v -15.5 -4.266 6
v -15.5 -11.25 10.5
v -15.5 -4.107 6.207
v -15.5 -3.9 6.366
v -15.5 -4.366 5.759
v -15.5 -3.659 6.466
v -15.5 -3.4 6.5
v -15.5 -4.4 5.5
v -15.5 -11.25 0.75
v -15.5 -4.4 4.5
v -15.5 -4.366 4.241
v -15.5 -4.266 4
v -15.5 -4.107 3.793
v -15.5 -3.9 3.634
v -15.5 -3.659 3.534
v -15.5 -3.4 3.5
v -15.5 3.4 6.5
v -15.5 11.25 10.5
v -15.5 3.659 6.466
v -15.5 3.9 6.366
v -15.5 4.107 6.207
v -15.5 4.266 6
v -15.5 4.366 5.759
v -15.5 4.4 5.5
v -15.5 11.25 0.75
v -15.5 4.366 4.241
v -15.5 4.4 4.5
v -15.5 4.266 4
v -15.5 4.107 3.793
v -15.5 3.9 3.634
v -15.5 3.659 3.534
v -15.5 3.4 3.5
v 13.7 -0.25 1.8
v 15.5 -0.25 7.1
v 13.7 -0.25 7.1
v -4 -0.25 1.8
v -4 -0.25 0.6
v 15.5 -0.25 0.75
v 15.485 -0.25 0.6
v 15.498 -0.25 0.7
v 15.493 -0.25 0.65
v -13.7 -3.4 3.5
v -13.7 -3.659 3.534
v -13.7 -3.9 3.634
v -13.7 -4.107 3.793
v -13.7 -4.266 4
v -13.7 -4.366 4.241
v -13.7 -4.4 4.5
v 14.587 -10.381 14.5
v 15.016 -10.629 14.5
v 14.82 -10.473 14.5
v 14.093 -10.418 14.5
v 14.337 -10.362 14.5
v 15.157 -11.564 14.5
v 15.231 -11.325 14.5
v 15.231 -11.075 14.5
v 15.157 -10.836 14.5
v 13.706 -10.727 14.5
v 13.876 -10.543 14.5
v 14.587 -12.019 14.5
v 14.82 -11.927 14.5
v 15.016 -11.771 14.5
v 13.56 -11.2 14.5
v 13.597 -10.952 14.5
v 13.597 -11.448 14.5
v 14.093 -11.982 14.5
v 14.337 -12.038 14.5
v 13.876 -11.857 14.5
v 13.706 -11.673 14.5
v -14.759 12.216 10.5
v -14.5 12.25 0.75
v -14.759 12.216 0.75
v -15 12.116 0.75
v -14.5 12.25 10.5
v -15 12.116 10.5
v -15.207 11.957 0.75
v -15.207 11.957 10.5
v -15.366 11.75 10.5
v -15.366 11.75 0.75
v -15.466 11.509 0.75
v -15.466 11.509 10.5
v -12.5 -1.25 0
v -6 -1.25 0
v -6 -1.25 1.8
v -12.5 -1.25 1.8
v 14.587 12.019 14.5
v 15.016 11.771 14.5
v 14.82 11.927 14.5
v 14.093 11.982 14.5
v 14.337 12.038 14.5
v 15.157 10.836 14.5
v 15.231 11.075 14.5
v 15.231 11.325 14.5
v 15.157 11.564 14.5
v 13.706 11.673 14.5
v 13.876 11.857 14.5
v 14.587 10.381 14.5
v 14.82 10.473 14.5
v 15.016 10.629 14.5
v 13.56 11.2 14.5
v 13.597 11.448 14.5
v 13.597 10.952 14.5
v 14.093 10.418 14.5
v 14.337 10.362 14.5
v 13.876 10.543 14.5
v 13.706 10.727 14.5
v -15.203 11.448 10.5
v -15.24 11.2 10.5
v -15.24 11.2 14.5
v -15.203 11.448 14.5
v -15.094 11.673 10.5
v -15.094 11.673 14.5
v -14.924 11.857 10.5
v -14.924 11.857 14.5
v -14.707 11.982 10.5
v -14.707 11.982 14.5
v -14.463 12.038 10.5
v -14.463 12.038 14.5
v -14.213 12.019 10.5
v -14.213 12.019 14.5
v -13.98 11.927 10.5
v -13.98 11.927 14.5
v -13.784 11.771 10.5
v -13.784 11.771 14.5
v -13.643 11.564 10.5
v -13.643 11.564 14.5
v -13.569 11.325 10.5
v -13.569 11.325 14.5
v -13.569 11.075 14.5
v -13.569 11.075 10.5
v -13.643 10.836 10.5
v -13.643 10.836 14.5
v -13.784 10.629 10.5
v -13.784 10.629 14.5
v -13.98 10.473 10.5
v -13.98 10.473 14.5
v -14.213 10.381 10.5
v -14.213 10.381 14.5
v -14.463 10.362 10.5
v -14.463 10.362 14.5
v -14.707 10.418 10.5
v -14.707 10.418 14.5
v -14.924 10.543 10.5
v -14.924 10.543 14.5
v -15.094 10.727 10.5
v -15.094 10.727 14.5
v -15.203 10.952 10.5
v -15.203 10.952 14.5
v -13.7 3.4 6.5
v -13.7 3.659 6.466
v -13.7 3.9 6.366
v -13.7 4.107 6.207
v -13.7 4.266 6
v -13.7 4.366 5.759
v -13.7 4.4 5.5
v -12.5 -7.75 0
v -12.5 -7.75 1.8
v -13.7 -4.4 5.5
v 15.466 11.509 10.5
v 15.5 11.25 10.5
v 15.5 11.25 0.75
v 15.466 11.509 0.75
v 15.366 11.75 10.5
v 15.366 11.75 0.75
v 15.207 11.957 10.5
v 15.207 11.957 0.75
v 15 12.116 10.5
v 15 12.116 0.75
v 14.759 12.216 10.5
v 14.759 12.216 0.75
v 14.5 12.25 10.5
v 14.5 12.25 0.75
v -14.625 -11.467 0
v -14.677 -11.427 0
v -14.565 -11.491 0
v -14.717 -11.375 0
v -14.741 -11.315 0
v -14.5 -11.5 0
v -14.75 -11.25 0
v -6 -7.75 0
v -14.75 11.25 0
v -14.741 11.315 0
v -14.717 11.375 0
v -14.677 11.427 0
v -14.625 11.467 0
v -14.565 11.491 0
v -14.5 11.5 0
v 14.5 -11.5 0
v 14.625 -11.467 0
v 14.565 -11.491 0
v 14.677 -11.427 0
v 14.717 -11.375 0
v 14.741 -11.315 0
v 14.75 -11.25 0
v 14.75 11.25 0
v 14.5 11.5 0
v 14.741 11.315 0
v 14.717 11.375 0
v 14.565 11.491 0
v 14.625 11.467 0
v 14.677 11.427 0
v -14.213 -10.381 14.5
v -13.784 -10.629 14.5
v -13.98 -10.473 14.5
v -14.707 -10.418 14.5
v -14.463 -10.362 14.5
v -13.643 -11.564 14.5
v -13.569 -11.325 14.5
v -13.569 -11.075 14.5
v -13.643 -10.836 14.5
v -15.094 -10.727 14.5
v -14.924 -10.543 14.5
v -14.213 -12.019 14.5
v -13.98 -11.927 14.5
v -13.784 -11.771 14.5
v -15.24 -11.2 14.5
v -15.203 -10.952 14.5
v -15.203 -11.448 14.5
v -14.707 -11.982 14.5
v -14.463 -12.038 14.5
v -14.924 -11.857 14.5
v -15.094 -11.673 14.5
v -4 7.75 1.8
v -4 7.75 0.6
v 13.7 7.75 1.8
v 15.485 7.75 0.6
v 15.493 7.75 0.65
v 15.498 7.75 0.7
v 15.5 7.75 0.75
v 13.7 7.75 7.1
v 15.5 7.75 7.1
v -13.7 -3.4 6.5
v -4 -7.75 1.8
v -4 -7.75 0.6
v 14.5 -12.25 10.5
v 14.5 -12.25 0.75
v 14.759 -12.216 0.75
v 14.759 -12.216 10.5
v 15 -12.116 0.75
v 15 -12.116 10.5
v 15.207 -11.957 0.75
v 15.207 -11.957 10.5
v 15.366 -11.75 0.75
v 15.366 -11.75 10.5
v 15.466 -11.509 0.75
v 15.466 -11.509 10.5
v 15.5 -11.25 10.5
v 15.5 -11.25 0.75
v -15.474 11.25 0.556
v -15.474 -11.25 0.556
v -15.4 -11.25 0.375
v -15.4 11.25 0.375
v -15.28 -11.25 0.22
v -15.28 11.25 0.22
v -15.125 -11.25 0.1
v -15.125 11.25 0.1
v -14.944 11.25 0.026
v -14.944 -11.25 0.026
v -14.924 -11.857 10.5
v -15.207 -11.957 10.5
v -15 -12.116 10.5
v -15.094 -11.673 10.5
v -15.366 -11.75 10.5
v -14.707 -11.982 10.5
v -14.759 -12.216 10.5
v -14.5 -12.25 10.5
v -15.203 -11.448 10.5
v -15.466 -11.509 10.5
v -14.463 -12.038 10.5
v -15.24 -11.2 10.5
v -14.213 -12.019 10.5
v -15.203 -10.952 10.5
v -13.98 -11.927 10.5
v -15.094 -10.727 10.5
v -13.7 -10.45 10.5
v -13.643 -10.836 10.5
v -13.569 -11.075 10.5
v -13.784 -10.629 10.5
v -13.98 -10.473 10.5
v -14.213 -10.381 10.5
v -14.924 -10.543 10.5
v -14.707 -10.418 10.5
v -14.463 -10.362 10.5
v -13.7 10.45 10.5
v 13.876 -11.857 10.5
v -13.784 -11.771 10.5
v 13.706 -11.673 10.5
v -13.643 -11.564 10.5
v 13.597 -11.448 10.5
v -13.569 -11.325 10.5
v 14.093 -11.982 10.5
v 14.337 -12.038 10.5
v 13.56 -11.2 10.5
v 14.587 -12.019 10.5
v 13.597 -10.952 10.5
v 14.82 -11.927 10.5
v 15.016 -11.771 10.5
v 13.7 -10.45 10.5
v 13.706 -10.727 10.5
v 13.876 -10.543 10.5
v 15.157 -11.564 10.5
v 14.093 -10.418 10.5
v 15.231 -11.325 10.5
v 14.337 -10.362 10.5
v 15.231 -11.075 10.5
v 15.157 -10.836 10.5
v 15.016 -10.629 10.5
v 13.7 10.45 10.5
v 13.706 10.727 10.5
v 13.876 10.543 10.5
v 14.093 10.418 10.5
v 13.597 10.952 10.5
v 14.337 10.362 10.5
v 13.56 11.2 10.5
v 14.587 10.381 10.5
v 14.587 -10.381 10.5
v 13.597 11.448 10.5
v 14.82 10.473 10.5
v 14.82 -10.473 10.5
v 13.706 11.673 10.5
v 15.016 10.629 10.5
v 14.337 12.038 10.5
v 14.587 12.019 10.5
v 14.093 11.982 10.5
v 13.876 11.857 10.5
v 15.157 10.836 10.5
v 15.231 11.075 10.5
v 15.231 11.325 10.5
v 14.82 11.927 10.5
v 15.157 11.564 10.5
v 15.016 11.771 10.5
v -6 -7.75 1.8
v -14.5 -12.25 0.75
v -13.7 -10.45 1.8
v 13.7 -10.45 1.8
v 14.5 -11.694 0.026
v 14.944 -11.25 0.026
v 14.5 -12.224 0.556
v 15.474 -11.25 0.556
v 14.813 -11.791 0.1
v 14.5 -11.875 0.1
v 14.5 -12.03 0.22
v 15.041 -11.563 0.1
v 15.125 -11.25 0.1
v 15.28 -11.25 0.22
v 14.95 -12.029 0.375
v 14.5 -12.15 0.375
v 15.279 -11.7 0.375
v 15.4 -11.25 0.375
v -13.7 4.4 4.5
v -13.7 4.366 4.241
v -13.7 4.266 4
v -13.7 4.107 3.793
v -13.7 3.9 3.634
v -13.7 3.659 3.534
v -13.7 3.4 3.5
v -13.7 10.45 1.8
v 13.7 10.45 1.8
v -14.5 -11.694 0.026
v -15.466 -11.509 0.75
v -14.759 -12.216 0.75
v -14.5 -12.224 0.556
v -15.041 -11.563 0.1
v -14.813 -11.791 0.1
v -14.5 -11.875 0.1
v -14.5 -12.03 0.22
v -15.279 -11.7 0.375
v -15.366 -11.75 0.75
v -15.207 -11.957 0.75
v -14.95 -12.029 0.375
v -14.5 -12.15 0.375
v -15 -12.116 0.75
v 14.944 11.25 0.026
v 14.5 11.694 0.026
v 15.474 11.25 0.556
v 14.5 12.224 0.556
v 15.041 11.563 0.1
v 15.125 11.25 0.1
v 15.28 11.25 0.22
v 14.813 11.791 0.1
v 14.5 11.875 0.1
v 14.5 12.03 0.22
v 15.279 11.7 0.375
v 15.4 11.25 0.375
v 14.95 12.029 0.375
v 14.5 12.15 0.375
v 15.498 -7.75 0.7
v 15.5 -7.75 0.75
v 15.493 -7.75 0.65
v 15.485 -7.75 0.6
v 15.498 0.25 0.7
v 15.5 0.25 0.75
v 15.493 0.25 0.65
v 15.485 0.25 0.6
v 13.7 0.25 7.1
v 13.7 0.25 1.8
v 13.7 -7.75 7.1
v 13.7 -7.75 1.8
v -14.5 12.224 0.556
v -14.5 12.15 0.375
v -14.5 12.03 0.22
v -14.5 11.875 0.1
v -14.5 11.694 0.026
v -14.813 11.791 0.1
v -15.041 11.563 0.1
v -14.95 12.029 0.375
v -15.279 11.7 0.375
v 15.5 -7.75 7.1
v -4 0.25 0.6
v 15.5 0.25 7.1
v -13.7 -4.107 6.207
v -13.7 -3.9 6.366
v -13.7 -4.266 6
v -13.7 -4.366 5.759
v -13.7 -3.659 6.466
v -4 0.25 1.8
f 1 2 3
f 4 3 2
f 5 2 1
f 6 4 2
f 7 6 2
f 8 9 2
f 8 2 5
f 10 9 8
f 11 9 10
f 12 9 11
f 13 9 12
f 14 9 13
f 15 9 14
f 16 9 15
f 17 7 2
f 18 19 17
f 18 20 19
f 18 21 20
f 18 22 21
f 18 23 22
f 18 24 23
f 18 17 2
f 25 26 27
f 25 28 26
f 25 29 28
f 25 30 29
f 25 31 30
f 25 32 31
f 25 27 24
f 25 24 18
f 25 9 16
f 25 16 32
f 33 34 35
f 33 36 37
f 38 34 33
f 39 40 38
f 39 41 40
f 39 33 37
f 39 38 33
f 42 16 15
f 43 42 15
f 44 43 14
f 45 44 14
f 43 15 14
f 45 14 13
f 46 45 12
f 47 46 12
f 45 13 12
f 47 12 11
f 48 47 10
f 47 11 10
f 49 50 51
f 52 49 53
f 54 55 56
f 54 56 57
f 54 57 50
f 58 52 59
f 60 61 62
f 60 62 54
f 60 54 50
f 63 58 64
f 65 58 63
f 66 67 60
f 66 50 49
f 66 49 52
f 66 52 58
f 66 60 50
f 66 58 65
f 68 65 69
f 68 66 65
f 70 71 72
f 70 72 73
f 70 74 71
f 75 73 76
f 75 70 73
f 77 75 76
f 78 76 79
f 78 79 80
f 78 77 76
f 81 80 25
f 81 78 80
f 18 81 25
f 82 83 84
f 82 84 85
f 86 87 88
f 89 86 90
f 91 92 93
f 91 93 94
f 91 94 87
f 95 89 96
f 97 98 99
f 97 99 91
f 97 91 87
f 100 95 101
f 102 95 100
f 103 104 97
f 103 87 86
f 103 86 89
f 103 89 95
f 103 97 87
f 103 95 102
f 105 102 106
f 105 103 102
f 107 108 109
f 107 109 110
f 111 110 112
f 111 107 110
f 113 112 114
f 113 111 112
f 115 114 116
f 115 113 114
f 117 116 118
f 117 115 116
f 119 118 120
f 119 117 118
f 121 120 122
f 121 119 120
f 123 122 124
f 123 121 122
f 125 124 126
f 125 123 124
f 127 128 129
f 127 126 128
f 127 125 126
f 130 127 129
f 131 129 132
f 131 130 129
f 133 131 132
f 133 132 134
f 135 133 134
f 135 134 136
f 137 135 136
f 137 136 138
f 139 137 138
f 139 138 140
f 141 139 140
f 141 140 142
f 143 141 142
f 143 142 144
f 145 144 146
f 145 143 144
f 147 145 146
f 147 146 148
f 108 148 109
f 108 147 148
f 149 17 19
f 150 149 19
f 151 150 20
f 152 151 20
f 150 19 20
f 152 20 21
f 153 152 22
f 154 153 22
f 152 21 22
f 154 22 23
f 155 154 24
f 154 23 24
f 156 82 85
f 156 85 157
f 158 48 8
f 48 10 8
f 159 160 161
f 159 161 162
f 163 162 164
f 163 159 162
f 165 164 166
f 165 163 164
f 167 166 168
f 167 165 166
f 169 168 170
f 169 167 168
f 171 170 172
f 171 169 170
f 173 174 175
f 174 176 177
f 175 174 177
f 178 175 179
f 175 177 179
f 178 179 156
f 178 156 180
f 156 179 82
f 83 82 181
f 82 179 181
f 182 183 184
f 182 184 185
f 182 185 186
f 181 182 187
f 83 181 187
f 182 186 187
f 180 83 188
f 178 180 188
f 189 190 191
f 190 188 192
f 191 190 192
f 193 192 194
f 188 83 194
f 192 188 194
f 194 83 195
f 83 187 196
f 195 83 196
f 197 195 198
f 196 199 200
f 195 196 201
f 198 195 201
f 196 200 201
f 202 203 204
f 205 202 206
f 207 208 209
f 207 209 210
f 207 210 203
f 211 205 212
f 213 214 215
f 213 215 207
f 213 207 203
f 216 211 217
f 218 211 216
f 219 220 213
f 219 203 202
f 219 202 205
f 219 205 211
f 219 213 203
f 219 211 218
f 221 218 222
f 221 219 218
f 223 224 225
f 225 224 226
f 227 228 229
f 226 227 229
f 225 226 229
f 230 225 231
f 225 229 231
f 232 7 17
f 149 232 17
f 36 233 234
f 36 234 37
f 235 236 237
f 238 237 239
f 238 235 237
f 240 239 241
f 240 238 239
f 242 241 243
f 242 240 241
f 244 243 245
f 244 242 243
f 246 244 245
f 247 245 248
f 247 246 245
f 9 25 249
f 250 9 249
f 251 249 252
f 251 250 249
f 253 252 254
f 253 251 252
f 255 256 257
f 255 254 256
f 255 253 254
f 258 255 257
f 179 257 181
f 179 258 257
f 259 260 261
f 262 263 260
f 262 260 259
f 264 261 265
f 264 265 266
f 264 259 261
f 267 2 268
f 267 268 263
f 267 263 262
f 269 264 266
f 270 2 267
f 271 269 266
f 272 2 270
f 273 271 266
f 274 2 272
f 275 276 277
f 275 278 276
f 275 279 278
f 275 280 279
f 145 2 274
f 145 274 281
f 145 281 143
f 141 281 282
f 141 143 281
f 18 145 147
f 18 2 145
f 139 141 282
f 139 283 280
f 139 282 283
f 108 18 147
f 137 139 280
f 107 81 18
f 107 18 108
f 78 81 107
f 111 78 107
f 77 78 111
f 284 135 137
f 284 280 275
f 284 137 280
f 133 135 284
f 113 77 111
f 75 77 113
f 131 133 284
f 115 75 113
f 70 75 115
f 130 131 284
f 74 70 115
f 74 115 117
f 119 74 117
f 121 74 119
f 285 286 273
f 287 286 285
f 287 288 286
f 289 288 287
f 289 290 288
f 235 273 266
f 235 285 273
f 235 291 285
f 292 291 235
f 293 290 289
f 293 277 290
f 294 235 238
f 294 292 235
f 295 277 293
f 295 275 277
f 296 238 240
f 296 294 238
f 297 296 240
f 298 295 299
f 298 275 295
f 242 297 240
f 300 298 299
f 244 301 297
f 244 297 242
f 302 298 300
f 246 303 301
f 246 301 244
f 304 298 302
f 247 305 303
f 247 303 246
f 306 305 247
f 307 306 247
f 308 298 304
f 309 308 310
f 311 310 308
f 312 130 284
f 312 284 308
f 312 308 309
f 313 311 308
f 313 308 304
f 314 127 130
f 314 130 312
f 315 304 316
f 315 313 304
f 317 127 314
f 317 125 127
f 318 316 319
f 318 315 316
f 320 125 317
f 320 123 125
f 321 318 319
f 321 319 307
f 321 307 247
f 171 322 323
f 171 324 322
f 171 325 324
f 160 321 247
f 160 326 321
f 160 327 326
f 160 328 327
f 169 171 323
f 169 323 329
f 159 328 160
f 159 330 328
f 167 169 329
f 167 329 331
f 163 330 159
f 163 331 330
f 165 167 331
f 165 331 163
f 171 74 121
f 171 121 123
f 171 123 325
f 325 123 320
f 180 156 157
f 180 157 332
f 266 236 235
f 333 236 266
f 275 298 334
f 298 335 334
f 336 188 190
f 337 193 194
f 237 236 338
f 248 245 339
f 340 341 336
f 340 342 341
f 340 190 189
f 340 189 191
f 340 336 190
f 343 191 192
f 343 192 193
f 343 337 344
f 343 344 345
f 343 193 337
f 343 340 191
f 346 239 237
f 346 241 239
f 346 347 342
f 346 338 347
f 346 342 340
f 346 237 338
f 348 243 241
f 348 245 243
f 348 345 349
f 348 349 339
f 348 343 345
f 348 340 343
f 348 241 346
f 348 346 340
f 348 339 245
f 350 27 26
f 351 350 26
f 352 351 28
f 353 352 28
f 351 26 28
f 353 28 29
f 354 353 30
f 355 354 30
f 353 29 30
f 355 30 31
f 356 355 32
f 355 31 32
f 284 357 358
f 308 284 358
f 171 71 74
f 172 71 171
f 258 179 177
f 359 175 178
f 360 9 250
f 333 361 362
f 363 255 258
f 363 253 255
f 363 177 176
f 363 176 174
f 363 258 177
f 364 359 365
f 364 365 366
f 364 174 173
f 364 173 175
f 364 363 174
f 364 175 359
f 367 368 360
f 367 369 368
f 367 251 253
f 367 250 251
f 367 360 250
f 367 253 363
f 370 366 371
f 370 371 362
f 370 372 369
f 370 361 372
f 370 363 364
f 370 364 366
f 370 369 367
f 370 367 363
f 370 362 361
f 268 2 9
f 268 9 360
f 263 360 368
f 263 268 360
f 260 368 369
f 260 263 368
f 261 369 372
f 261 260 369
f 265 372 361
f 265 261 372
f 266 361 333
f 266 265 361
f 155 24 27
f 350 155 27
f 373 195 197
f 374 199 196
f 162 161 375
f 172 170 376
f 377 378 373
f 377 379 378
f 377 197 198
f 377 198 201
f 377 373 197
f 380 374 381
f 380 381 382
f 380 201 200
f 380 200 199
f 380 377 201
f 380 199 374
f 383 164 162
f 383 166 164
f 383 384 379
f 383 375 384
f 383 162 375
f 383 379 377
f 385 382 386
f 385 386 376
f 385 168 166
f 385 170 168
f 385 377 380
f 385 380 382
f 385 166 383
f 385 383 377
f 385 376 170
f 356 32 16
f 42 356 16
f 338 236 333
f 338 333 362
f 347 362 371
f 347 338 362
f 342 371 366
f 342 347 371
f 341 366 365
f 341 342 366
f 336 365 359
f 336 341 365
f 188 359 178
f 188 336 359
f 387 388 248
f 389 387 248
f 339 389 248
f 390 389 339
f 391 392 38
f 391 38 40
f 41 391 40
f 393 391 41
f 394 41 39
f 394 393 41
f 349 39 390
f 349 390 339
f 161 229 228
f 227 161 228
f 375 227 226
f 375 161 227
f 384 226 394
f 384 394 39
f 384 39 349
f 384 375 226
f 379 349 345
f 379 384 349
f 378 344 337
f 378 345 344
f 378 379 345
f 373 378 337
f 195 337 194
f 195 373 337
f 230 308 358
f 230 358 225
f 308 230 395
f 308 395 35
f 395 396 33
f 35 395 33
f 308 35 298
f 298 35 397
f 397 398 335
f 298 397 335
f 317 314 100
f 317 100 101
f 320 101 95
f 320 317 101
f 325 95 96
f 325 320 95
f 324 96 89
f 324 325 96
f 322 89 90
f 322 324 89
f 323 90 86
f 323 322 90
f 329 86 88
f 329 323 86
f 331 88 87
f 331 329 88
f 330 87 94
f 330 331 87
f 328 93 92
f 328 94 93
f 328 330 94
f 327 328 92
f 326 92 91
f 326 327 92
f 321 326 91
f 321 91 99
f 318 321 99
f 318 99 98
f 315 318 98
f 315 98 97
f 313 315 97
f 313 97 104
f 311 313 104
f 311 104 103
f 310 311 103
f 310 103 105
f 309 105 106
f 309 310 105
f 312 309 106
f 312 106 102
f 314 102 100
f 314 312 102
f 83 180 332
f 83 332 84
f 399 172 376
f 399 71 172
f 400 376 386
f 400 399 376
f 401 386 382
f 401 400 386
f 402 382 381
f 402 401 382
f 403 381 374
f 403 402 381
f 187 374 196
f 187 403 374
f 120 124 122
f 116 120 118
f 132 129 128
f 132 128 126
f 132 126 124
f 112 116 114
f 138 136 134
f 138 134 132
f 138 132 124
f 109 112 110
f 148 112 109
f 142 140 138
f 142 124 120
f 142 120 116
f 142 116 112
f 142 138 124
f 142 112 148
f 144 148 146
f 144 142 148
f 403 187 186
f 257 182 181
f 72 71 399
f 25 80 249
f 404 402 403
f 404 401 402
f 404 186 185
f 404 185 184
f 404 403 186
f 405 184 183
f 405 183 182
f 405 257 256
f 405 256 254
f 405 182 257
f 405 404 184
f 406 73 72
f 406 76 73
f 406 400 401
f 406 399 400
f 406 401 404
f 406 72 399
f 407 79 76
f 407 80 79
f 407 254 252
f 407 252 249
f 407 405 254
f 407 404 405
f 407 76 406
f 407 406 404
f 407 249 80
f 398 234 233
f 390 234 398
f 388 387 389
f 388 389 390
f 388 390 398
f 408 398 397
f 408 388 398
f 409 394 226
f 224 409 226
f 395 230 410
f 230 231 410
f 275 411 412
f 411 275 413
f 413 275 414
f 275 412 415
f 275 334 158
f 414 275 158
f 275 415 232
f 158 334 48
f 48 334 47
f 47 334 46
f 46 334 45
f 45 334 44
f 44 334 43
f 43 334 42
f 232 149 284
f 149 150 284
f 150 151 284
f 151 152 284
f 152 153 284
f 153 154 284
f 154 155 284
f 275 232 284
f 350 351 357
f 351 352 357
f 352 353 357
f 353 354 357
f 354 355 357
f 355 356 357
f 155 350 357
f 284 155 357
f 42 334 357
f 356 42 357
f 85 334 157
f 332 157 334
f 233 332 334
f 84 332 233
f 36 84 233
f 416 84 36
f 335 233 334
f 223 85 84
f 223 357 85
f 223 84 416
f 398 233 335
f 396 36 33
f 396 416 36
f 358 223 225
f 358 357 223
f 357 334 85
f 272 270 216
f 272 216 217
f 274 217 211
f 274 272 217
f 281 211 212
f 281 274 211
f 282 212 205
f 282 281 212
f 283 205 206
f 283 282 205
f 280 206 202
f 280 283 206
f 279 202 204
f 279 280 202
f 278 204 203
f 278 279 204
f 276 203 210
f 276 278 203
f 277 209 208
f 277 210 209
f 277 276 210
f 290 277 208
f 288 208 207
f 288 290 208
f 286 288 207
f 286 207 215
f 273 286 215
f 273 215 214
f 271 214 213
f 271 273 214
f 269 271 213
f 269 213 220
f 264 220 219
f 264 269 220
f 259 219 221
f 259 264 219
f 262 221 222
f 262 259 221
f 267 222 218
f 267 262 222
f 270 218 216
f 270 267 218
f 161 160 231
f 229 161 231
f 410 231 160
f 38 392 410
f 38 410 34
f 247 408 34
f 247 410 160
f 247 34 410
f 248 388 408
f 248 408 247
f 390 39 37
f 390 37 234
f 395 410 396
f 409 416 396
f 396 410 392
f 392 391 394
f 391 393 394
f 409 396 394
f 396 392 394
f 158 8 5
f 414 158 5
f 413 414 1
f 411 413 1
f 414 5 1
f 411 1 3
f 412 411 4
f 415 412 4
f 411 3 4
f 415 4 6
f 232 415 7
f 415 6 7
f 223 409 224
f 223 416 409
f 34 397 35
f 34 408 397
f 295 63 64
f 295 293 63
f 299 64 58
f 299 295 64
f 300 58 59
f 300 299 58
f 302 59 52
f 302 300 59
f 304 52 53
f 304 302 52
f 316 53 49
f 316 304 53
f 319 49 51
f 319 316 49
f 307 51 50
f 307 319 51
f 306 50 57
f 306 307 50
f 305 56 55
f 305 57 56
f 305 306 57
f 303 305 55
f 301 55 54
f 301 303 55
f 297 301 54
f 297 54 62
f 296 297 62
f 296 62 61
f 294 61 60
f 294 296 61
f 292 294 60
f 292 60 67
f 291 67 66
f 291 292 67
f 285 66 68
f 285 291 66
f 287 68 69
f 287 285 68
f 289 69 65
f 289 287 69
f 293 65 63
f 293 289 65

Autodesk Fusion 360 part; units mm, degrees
sketch "Sketch1" plane through (0, 0, 0) normal (0, 0, 1) x (1, 0, 0)
  line L0 (-15.5, 12.25) -> (15.5, 12.25)
  line L1 (15.5, 12.25) -> (15.5, -12.25)
  line L2 (15.5, -12.25) -> (-15.5, -12.25)
  line L3 (-15.5, -12.25) -> (-15.5, 12.25)
  line L4 (-15.5, 12.25) -> (15.5, -12.25) construction
  line L5 (15.5, 12.25) -> (-15.5, -12.25) construction
  dimension "d1" = 31
  dimension "d2" = 24.5
extrude "Extrude1" add sketch "Sketch1" along normal blind 10.5
shell "Shell1" thickness 1.8 removed faces 1 at (-5.1667, 4.0833, 10.5)
sketch "Sketch2" plane through (0, 0, 10.5) normal (0, 0, 1) x (-1, 0, 0)
  line L0 (13.7, 10.45) -> (13.7, -10.45)
  line L1 (13.7, -10.45) -> (-13.7, -10.45)
  line L2 (-13.7, -10.45) -> (-13.7, 10.45)
  line L3 (-13.7, 10.45) -> (13.7, 10.45)
  line L4 (15.5, 12.25) -> (-15.5, 12.25)
  line L5 (-15.5, 12.25) -> (-15.5, -12.25)
  line L6 (-15.5, -12.25) -> (15.5, -12.25)
  line L7 (15.5, -12.25) -> (15.5, 12.25)
  circle A0 centre (14.4, -11.2) radius 0.84
  line L8 (0, 0) -> (0, -2)
  line L9 (0, 0) -> (4, 0)
  circle A1 centre (-14.4, -11.2) radius 0.84
  circle A2 centre (-14.4, 11.2) radius 0.84
  circle A3 centre (14.4, 11.2) radius 0.84
  dimension "d6" = 1.68
  dimension "d7" = 11.2
  dimension "d8" = 14.4
extrude "Extrude2" add sketch "Sketch2" along normal blind 4 contours A0 | A1 | A2 | A3
fillet "Fillet1" radius 1 1 edges at (15.5, -12.25, 5.25)
fillet "Fillet1" radius 1 1 edges at (15.5, 12.25, 5.25)
fillet "Fillet1" radius 1 1 edges at (-15.5, 12.25, 5.25)
fillet "Fillet1" radius 1 1 edges at (-15.5, -12.25, 5.25)
sketch "Sketch3" plane through (-15.5, 0, 0) normal (-1, 0, 0) x (0, -1, 0)
  line L0 (11.25, 0) -> (11.25, 10.5)
  line L1 (11.25, 10.5) -> (-11.25, 10.5)
  line L2 (-11.25, 10.5) -> (-11.25, 0)
  line L3 (-11.25, 0) -> (11.25, 0)
  line L4 (0, 0) -> (0, 3.5)
  line L5 (0, 3.5) -> (0, 5)
  line L6 (-3.4, 3.5) -> (3.4, 3.5)
  line L7 (4.4, 4.5) -> (4.4, 5.5)
  line L8 (3.4, 6.5) -> (-3.4, 6.5)
  line L9 (-4.4, 5.5) -> (-4.4, 4.5)
  line L10 (-4.4, 3.5) -> (4.4, 6.5) construction
  line L11 (4.4, 3.5) -> (-4.4, 6.5) construction
  arc A0 (-3.4, 6.5) -> (-4.4, 5.5) centre (-3.4, 5.5) ccw
  arc A1 (-4.4, 4.5) -> (-3.4, 3.5) centre (-3.4, 4.5) ccw
  arc A2 (3.4, 3.5) -> (4.4, 4.5) centre (3.4, 4.5) ccw
  arc A3 (4.4, 5.5) -> (3.4, 6.5) centre (3.4, 5.5) ccw
  point P0 (0, 5)
  dimension "d19" = 3.5
  dimension "d20" = 1.5
  dimension "d21" = 3
  dimension "d22" = 8.8
  dimension "d23" = 1
extrude "Extrude3" cut sketch "Sketch3" against normal blind 6 contours L6 L7 L8 L9 A0 A1 A2 A3
fillet "Fillet2" radius 0.75 8 edges at (-15.2071, -11.9571, 0) (-15.5, 0, 0) (-15.2071, 11.9571, 0) (0, 12.25, 0) (15.2071, 11.9571, 0) (15.5, 0, 0) (15.2071, -11.9571, 0) (0, -12.25, 0)
sketch "Sketch4" plane through (0, 0, 0) normal (0, 0, -1) x (1, 0, 0)
  arc A0 (-14.5, 11.5) -> (-14.75, 11.25) centre (-14.5, 11.25) ccw
  line L0 (-14.75, 11.25) -> (-14.75, -11.25)
  arc A1 (-14.75, -11.25) -> (-14.5, -11.5) centre (-14.5, -11.25) ccw
  line L1 (-14.5, -11.5) -> (14.5, -11.5)
  arc A2 (14.5, -11.5) -> (14.75, -11.25) centre (14.5, -11.25) ccw
  line L2 (14.75, -11.25) -> (14.75, 11.25)
  arc A3 (14.75, 11.25) -> (14.5, 11.5) centre (14.5, 11.25) ccw
  line L3 (14.5, 11.5) -> (-14.5, 11.5)
  line L4 (-14.75, 0) -> (-12.7501, 0.0149)
  line L5 (7.2499, 0.0149) -> (7.2499, 8.7649)
  line L6 (7.2499, 8.7649) -> (-12.7501, 8.7649)
  line L7 (-12.7501, 8.7649) -> (-12.7501, 0.0149)
  line L8 (7.2499, 0.0149) -> (7.2499, -8.7351)
  line L9 (7.2499, -8.7351) -> (-12.7501, -8.7351)
  line L10 (-12.7501, -8.7351) -> (-12.7501, 0.0149)
  line L11 (-12.7501, -8.7351) -> (-11.7501, -8.7351)
  line L12 (-11.7501, -8.7351) -> (-11.7501, -7.7351)
  line L13 (-11.7501, -7.7351) -> (-5.2501, -7.7351)
  line L14 (-5.2501, -7.7351) -> (-5.2501, -1.2351)
  line L15 (-5.2501, -1.2351) -> (-11.7501, -1.2351)
  line L16 (-11.7501, -1.2351) -> (-11.7501, -7.7351)
  line L17 (7.2499, 8.7649) -> (6.2499, 8.7649)
  line L18 (-5.2501, -7.7351) -> (-2.2501, -7.7351)
  line L19 (-2.2501, -7.7351) -> (12.4499, -7.7351)
  line L20 (12.4499, -7.7351) -> (12.4499, -0.7351)
  dimension "d32" = 20
  dimension "d33" = 8.75
  dimension "d34" = 1
  dimension "d35" = 1
  dimension "d38" = 6.5
  dimension "d39" = 6.5
  dimension "d42" = 1
  dimension "d54" = 3
  dimension "d55" = 14.7
  dimension "d56" = 7
sketch "Sketch6" plane through (0, 0, 0) normal (0, 0, -1) x (1, 0, 0)
  arc A0 (-14.5, 11.5) -> (-14.75, 11.25) centre (-14.5, 11.25) ccw
  line L0 (-14.75, 11.25) -> (-14.75, -11.25)
  arc A1 (-14.75, -11.25) -> (-14.5, -11.5) centre (-14.5, -11.25) ccw
  line L1 (-14.5, -11.5) -> (14.5, -11.5)
  arc A2 (14.5, -11.5) -> (14.75, -11.25) centre (14.5, -11.25) ccw
  line L2 (14.75, -11.25) -> (14.75, 11.25)
  arc A3 (14.75, 11.25) -> (14.5, 11.5) centre (14.5, 11.25) ccw
  line L3 (14.5, 11.5) -> (-14.5, 11.5)
  line L4 (-15.5, 0) -> (-13.5, 0)
  line L5 (6.5, 0) -> (6.5, 8.75)
  line L6 (6.5, 8.75) -> (-13.5, 8.75)
  line L7 (-13.5, 8.75) -> (-13.5, 0)
  line L8 (-13.5, -8.75) -> (-13.5, 0)
  line L9 (6.5, -8.75) -> (-13.5, -8.75)
  line L10 (6.5, 0) -> (6.5, -8.75)
  line L11 (-13.5, 8.75) -> (-13.5, 7.75)
  line L12 (-13.5, 7.75) -> (-12.5, 7.75)
  line L13 (-12.5, 7.75) -> (-6, 7.75)
  line L14 (-6, 7.75) -> (-6, 1.25)
  line L15 (-6, 1.25) -> (-12.5, 1.25)
  line L16 (-12.5, 1.25) -> (-12.5, 7.75)
  point P0 (-13.7, 10.45)
  dimension "d57" = 2
  dimension "d58" = 10.45
  dimension "d61" = 20
  dimension "d62" = 8.75
  dimension "d63" = 1
  dimension "d64" = 1
  dimension "d65" = 6.5
  dimension "d66" = 6.5
extrude "Extrude5" cut sketch "Sketch6" against normal blind 9 contours L13 L14 L15 L16
sketch "Sketch7" plane through (15.5, 0, 0) normal (1, 0, 0) x (0, 1, 0)
  line L0 (-11.25, 0.75) -> (11.25, 0.75)
  line L1 (11.25, 0.75) -> (11.25, 10.5)
  line L2 (11.25, 10.5) -> (-11.25, 10.5)
  line L3 (-11.25, 10.5) -> (-11.25, 0.75)
  line L4 (0, 10.5) -> (0, 7.1)
  line L5 (-8.75, 7.1) -> (-8.75, 10.5)
  line L6 (-8.75, 7.1) -> (-7.75, 7.1)
  line L7 (-7.75, 7.1) -> (-0.25, 7.1)
  line L8 (-0.25, 7.1) -> (-0.25, 0.6)
  line L9 (-0.25, 0.6) -> (-7.75, 0.6)
  line L10 (-7.75, 0.6) -> (-7.75, 7.1)
  line L11 (0.25, 7.1) -> (0.25, 0.6)
  line L12 (0.25, 0.6) -> (7.75, 0.6)
  line L13 (7.75, 0.6) -> (7.75, 7.1)
  line L14 (7.75, 7.1) -> (0.25, 7.1)
  dimension "d69" = 3.4
  dimension "d70" = 8.75
  dimension "d73" = 1
  dimension "d74" = 7.5
  dimension "d75" = 6.5
extrude "Extrude6" cut sketch "Sketch7" against normal blind 19.5 contours L0 L7 L8 L10 | L0 L8 L9 L10 | L0 L11 L13 L14 | L0 L11 L12 L13
